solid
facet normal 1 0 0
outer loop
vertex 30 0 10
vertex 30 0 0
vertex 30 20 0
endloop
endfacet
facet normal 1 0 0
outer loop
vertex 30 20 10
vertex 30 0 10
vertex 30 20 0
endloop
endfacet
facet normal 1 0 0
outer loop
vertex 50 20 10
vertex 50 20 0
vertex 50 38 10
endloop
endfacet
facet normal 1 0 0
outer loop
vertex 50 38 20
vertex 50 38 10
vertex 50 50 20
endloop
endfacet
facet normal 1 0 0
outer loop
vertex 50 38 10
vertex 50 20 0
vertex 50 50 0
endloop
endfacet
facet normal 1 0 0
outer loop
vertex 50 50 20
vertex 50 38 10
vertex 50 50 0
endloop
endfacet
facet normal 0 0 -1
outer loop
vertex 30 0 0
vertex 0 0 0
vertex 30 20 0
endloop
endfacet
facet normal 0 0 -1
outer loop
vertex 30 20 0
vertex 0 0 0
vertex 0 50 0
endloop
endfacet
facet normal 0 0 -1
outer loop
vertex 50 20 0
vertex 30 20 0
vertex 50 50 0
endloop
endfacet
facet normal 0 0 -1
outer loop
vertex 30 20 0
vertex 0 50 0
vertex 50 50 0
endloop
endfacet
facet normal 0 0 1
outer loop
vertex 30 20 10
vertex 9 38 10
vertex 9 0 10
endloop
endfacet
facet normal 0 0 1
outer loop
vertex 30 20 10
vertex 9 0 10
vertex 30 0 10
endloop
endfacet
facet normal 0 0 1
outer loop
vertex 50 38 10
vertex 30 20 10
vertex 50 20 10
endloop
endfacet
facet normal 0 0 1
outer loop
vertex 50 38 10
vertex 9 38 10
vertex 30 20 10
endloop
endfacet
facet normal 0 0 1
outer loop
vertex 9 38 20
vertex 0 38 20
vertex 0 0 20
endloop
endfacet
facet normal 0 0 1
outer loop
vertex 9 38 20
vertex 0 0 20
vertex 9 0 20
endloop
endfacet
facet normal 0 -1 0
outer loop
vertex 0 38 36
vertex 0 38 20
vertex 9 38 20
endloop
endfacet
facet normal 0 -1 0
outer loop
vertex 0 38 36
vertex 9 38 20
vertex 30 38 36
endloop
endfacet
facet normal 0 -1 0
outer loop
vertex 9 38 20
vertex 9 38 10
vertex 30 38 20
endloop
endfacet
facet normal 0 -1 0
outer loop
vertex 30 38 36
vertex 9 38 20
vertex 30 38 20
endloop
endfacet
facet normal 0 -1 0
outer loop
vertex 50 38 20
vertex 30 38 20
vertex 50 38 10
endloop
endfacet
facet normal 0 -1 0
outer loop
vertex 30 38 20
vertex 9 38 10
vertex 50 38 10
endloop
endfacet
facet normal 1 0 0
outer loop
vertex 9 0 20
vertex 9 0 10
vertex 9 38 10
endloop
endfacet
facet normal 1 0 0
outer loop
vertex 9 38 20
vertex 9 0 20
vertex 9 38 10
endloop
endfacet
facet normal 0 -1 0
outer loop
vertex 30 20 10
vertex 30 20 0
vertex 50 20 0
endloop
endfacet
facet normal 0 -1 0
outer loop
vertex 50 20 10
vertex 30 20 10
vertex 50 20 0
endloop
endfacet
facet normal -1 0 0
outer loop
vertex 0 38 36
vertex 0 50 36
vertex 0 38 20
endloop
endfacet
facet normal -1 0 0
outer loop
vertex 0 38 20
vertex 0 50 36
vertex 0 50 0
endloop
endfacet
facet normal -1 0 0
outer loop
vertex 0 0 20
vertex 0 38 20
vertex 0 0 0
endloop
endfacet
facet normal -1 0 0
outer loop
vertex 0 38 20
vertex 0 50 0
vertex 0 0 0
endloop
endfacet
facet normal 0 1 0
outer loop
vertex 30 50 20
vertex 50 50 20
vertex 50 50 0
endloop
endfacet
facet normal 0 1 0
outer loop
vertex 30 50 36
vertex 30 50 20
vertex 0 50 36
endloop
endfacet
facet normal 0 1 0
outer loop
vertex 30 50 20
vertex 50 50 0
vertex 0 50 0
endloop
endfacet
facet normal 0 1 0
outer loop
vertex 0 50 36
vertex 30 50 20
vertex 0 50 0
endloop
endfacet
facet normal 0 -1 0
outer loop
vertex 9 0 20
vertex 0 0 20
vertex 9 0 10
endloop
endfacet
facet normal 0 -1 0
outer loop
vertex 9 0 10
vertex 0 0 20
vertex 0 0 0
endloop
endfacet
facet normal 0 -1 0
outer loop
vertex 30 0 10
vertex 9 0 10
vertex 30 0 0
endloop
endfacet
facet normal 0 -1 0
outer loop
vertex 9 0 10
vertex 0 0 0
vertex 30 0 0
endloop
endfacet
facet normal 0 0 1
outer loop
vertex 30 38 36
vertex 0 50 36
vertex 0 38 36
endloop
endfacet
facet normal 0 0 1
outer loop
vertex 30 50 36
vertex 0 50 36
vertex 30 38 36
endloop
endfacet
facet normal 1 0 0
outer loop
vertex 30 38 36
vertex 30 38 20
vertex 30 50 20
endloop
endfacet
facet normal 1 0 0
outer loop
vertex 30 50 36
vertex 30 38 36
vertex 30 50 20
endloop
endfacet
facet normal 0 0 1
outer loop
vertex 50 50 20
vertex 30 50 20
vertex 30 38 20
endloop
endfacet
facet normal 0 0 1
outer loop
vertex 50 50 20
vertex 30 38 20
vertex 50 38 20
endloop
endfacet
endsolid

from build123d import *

# Parameters (mm, degrees)
F0_W     = 9
F0_H     = 38
F0_W_2   = 20
F0_H_2   = 12
F1_DEPTH = 10
F2_DEPTH = 20
F3_DEPTH = 36


with BuildPart() as f1:
    # F0 (on Top) → F1 (new body)
    with BuildSketch(Plane.XY):
        with Locations((4.5, 19)):
            Rectangle(F0_W, F0_H)
        with Locations((40, 44)):
            Rectangle(F0_W_2, F0_H_2)
        Polygon((0, 50), (0, 38), (9, 38), (30, 38), (30, 50), align=None)
        Polygon((9, 38), (9, 0), (30, 0), (30, 20), (50, 20), (50, 38), (30, 38), align=None)
    extrude(amount=F1_DEPTH)

    # F0 (on Top) → F2 (join)
    with BuildSketch(Plane.XY):
        with Locations((4.5, 19)):
            Rectangle(F0_W, F0_H)
        Polygon((0, 50), (0, 38), (9, 38), (30, 38), (30, 50), align=None)
        with Locations((40, 44)):
            Rectangle(F0_W_2, F0_H_2)
    extrude(amount=F2_DEPTH)

    # F0 (on Top) → F3 (join)
    with BuildSketch(Plane.XY):
        Polygon((0, 50), (0, 38), (9, 38), (30, 38), (30, 50), align=None)
    extrude(amount=F3_DEPTH)


solid = f1.part
